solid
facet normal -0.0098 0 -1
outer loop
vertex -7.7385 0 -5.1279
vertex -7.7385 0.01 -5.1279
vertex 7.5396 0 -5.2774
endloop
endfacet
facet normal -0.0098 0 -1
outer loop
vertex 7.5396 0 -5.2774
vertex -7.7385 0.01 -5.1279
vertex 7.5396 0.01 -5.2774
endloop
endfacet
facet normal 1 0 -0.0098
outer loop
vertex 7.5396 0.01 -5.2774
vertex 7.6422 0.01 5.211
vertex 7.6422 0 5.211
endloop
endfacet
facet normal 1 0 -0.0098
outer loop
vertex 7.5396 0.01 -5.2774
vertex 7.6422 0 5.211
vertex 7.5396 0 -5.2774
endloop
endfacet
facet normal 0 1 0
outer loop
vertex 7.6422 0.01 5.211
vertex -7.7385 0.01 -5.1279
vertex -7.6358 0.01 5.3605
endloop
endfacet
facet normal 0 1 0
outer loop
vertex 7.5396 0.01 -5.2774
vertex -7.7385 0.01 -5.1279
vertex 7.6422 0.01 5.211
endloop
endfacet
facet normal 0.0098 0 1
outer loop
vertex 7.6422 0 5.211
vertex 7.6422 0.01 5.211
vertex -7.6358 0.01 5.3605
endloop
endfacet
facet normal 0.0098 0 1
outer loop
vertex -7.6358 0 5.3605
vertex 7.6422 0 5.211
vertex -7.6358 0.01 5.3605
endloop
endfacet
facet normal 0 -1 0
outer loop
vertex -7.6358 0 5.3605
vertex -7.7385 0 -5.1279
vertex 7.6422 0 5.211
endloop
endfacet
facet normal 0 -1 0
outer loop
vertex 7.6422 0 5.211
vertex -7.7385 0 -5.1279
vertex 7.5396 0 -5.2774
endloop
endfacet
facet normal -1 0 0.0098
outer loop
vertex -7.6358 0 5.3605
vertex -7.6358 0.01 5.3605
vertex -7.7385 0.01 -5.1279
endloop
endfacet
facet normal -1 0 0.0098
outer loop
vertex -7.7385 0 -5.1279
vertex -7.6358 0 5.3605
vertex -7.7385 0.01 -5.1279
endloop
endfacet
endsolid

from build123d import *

# Parameters (mm, degrees)
SKETCH_1_W          = 17
SKETCH_1_H          = 12
EXTRUDE_1_DEPTH     = 0.01
SKETCH_2_W          = 23.426921432
SKETCH_2_H          = 16.11755769
CUT_EXTRUDE_1_DEPTH = 0.01
CUT_EXTRUDE_2_DEPTH = 0.01


with BuildPart() as part:
    # Эскиз1 → Бобышка-Вытянуть1 (new body)
    with BuildSketch(Plane(origin=(0, 0, 0), x_dir=(1, 0, 0), z_dir=(0, 1, 0))):
        Rectangle(SKETCH_1_W, SKETCH_1_H)
    extrude(amount=EXTRUDE_1_DEPTH)

    # Эскиз2 → Вырез-Вытянуть1 (cut)
    with BuildSketch(Plane(origin=(0, 0.01, 0), x_dir=(1, 0, 0), z_dir=(0, 1, 0))):
        Rectangle(SKETCH_2_W, SKETCH_2_H)
        Polygon((-7.738482856, 5.127895165), (7.639585466, 5.278414594), (7.742245069, -5.209974858), (-7.635823253, -5.360494287), align=None, mode=Mode.SUBTRACT)
    extrude(amount=-CUT_EXTRUDE_1_DEPTH, mode=Mode.SUBTRACT)

    # Эскиз3 → Вырез-Вытянуть2 (cut)
    with BuildSketch(Plane(origin=(0, 0.01, 0), x_dir=(1, 0, 0), z_dir=(0, 1, 0))):
        Polygon((7.639585466, 5.278414594), (7.742245069, -5.209974858), (7.642245069, -5.210953651), (7.539585466, 5.277435801), align=None)
    extrude(amount=-CUT_EXTRUDE_2_DEPTH, mode=Mode.SUBTRACT)


solid = part.part
